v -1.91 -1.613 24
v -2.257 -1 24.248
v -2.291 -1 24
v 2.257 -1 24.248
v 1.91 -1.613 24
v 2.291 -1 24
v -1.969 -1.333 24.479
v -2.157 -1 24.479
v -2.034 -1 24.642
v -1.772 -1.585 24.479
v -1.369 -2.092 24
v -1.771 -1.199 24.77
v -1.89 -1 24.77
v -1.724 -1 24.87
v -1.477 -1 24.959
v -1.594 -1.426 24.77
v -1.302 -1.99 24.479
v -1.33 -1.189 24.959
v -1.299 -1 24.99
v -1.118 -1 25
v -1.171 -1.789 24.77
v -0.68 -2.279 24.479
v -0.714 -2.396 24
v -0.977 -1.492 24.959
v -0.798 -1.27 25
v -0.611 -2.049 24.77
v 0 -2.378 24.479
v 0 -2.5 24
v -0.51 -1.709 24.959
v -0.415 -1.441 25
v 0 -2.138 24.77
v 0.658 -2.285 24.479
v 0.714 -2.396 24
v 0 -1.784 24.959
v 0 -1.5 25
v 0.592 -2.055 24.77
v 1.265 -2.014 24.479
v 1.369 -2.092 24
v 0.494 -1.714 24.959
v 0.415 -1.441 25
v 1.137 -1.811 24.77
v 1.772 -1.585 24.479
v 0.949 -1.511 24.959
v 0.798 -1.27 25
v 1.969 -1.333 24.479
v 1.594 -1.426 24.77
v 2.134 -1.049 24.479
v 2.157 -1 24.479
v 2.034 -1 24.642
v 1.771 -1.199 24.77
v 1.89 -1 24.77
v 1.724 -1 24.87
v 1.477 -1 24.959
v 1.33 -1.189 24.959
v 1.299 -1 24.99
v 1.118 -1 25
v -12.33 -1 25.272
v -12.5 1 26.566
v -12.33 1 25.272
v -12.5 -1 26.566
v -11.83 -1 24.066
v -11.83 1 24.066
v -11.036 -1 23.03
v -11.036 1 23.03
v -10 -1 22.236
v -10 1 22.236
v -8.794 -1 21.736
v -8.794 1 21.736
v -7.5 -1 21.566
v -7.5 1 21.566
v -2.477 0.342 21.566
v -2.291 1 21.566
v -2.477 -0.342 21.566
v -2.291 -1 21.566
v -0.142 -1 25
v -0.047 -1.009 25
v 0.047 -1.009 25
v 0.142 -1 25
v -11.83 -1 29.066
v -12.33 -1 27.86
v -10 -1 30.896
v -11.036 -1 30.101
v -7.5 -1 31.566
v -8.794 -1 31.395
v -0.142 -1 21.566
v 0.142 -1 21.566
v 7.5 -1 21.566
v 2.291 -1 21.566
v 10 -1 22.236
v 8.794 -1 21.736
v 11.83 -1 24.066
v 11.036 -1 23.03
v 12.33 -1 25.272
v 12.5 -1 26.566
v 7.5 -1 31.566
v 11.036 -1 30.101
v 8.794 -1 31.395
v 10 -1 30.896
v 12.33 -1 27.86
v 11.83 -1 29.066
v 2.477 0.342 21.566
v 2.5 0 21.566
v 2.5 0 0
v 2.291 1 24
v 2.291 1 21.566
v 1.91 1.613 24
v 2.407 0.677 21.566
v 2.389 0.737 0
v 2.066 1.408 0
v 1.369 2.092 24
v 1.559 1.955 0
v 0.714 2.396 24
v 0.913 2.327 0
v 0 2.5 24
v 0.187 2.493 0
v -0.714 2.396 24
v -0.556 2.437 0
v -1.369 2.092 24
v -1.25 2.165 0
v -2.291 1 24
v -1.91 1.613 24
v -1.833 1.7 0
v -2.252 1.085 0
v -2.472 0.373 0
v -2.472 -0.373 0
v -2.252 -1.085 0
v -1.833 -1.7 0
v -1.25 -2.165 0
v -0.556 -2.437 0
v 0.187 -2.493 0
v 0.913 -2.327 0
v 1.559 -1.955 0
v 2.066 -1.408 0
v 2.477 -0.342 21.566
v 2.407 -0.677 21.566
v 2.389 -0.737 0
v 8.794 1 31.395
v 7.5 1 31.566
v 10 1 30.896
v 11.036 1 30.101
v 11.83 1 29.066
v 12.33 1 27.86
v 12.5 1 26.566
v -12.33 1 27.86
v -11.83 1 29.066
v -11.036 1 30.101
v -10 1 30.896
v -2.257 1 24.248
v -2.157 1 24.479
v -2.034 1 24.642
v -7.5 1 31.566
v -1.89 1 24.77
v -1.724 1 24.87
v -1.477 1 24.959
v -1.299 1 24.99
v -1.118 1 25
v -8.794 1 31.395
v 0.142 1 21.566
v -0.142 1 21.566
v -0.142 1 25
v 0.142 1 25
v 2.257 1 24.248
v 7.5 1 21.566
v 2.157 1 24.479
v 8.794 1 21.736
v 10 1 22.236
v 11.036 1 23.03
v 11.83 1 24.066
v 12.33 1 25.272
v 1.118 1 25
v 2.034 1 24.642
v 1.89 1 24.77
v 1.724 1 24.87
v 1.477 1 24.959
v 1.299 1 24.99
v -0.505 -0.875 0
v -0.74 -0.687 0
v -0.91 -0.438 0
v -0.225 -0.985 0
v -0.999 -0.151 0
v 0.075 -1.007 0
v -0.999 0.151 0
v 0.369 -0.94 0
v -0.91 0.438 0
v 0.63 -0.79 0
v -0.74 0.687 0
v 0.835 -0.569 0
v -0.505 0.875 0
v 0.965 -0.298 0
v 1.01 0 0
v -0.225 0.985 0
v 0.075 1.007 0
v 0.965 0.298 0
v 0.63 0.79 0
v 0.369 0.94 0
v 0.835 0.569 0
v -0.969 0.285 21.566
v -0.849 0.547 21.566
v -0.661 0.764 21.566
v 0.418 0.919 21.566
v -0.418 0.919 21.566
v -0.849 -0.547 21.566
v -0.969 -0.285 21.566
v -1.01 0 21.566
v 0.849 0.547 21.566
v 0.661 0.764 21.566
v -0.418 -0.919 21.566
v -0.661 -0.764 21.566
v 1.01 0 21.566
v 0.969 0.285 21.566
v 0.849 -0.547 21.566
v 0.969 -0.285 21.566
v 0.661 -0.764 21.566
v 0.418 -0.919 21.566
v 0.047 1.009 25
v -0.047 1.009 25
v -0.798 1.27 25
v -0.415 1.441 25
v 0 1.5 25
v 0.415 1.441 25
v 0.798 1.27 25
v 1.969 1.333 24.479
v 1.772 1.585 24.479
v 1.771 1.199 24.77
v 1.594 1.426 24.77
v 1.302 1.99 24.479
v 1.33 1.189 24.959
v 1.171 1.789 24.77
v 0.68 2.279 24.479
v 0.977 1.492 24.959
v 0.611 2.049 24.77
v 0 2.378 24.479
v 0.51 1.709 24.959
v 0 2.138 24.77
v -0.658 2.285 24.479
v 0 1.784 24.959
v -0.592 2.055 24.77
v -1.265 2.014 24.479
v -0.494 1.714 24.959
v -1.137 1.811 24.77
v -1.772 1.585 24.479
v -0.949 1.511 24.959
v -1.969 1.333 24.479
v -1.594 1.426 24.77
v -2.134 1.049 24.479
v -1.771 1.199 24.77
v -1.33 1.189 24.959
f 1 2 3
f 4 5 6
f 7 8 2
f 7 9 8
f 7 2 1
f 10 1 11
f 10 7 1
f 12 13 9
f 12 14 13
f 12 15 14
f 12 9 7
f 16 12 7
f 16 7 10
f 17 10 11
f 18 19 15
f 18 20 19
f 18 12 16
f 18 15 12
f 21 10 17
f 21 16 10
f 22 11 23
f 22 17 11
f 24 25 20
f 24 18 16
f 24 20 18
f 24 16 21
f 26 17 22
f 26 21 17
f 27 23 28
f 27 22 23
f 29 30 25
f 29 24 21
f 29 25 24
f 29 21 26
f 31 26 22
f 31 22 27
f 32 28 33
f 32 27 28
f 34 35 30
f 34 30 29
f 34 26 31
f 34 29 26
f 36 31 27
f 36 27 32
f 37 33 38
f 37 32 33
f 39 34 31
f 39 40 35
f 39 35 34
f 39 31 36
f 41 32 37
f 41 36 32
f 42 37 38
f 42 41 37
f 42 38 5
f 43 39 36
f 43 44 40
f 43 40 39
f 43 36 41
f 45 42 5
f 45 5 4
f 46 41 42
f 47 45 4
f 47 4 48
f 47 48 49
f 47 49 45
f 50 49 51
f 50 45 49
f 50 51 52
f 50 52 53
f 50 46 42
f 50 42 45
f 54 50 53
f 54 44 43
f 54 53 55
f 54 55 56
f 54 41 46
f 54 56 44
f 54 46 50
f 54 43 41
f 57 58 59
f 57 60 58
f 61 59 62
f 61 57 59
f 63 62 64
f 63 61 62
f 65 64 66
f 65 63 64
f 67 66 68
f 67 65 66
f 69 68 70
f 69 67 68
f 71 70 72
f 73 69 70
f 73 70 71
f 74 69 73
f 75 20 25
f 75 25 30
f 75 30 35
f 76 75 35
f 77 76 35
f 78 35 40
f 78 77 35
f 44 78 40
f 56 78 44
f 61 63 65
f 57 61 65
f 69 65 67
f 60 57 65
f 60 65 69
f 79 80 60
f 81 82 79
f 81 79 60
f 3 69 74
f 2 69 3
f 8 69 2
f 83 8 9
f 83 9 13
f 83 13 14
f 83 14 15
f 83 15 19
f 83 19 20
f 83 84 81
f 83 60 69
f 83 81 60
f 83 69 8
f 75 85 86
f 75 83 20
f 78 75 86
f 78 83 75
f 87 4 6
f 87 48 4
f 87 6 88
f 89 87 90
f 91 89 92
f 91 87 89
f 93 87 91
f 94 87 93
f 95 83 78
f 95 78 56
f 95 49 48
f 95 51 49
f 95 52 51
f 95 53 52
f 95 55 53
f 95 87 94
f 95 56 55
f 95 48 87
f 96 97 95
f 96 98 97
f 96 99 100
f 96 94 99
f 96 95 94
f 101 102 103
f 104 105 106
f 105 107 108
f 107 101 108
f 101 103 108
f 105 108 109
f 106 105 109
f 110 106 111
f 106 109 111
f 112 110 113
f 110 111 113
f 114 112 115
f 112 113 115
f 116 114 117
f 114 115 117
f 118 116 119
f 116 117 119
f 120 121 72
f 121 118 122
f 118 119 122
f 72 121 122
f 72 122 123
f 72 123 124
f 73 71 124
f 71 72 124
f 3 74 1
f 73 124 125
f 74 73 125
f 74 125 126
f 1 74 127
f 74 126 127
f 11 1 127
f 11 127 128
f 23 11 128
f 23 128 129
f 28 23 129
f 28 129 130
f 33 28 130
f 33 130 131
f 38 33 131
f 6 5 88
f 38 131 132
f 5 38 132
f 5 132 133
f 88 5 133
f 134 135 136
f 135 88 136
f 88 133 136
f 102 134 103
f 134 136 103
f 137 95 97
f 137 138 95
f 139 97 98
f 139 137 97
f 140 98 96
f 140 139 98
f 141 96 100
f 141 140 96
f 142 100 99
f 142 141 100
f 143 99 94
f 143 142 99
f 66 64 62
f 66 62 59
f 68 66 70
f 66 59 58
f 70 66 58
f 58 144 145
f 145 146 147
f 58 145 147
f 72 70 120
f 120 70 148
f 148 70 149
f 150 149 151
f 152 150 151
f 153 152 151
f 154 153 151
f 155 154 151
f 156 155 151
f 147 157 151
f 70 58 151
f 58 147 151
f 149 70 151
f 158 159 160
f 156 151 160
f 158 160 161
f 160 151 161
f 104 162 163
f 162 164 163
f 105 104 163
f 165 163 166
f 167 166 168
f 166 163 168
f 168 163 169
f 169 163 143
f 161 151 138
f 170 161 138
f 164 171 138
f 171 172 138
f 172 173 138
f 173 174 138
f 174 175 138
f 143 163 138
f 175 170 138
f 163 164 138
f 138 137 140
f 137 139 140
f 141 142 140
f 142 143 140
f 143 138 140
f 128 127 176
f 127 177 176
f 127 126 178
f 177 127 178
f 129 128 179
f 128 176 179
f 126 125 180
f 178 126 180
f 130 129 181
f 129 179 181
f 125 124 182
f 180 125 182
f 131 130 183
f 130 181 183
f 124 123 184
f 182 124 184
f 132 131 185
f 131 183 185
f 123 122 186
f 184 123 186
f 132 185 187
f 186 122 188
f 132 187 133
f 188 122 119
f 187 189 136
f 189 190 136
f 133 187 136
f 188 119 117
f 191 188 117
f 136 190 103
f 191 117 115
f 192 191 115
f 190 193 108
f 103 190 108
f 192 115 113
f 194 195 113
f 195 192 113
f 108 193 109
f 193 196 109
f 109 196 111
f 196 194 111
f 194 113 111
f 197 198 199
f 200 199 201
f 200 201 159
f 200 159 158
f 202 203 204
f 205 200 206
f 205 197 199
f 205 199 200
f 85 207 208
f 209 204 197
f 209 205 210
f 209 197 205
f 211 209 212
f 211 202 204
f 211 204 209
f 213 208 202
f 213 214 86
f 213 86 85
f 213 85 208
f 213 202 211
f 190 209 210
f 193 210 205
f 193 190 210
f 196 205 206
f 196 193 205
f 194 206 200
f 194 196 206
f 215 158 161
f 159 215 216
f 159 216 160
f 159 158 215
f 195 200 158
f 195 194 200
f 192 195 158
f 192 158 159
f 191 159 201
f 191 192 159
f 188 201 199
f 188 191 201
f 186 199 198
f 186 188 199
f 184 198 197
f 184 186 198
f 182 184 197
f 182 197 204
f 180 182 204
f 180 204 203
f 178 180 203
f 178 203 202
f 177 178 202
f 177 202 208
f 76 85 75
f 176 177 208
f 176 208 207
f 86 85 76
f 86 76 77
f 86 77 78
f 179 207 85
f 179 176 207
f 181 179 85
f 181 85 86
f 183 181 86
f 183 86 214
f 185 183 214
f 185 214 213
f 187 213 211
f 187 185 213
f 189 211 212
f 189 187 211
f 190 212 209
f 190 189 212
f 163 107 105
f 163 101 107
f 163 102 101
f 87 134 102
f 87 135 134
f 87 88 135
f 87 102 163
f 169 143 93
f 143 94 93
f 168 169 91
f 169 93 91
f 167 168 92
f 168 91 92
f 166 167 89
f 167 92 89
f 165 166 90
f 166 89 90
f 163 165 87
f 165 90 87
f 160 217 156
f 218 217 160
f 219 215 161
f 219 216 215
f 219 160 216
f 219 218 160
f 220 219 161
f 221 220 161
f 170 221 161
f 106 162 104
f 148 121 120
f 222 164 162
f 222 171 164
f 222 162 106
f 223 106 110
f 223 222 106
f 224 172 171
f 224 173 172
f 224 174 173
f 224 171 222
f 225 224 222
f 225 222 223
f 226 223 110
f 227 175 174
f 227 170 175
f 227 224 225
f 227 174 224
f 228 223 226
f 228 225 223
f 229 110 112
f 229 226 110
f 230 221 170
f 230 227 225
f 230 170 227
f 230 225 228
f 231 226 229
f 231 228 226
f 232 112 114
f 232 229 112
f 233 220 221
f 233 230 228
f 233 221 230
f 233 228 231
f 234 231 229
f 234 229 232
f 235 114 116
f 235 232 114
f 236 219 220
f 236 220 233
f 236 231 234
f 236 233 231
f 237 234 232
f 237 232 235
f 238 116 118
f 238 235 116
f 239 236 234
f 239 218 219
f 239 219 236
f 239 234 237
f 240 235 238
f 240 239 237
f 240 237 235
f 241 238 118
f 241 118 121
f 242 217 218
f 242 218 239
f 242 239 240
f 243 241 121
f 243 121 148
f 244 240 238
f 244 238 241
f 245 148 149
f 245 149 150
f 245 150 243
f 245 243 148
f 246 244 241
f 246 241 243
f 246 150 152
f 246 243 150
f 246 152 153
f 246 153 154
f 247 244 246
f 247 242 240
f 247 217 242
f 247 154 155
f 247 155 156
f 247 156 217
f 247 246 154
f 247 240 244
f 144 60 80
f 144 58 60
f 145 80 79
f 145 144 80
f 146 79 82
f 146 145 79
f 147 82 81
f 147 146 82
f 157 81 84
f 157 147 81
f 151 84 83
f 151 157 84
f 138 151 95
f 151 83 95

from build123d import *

# Parameters (mm, degrees)
F0_R     = 2.5
F0_R_2   = 1.01
F1_DEPTH = 25
F2_W     = 25
F2_H     = 10
F3_DEPTH = 1
F4_R     = 4.99999
F5_R     = 1


# Not quite as in the source:
# - a fillet or chamfer is up to 0.001 mm smaller than in the source, because OpenCascade refuses the exact size


with BuildPart() as f1:
    # F0 (on Top) → F1 (new body)
    with BuildSketch(Plane.XY):
        Circle(F0_R)
        Circle(F0_R_2, mode=Mode.SUBTRACT)
    extrude(amount=F1_DEPTH)

    # F2 (on Front) → F3 (join, symmetric)
    with BuildSketch(Plane.XZ):
        with Locations((0, 26.5656393021)):
            Rectangle(F2_W, F2_H)
    extrude(amount=F3_DEPTH, both=True)

    # F4 (radius 5 in the source; OpenCascade refuses exactly that, so slightly less here)
    f4_edges = [f1.edges().sort_by_distance(p)[0] for p in [
        (-12.5, 0, 21.565639),
        (-12.5, 0, 31.565639),
        (12.5, 0, 21.565639),
        (12.5, 0, 31.565639),
    ]]
    fillet(f4_edges, radius=F4_R)

    # F5
    f5_edges = [f1.edges().sort_by_distance(p)[0] for p in [
        (0, 2.5, 25),
        (0, -2.5, 25),
    ]]
    fillet(f5_edges, radius=F5_R)


solid = f1.part
